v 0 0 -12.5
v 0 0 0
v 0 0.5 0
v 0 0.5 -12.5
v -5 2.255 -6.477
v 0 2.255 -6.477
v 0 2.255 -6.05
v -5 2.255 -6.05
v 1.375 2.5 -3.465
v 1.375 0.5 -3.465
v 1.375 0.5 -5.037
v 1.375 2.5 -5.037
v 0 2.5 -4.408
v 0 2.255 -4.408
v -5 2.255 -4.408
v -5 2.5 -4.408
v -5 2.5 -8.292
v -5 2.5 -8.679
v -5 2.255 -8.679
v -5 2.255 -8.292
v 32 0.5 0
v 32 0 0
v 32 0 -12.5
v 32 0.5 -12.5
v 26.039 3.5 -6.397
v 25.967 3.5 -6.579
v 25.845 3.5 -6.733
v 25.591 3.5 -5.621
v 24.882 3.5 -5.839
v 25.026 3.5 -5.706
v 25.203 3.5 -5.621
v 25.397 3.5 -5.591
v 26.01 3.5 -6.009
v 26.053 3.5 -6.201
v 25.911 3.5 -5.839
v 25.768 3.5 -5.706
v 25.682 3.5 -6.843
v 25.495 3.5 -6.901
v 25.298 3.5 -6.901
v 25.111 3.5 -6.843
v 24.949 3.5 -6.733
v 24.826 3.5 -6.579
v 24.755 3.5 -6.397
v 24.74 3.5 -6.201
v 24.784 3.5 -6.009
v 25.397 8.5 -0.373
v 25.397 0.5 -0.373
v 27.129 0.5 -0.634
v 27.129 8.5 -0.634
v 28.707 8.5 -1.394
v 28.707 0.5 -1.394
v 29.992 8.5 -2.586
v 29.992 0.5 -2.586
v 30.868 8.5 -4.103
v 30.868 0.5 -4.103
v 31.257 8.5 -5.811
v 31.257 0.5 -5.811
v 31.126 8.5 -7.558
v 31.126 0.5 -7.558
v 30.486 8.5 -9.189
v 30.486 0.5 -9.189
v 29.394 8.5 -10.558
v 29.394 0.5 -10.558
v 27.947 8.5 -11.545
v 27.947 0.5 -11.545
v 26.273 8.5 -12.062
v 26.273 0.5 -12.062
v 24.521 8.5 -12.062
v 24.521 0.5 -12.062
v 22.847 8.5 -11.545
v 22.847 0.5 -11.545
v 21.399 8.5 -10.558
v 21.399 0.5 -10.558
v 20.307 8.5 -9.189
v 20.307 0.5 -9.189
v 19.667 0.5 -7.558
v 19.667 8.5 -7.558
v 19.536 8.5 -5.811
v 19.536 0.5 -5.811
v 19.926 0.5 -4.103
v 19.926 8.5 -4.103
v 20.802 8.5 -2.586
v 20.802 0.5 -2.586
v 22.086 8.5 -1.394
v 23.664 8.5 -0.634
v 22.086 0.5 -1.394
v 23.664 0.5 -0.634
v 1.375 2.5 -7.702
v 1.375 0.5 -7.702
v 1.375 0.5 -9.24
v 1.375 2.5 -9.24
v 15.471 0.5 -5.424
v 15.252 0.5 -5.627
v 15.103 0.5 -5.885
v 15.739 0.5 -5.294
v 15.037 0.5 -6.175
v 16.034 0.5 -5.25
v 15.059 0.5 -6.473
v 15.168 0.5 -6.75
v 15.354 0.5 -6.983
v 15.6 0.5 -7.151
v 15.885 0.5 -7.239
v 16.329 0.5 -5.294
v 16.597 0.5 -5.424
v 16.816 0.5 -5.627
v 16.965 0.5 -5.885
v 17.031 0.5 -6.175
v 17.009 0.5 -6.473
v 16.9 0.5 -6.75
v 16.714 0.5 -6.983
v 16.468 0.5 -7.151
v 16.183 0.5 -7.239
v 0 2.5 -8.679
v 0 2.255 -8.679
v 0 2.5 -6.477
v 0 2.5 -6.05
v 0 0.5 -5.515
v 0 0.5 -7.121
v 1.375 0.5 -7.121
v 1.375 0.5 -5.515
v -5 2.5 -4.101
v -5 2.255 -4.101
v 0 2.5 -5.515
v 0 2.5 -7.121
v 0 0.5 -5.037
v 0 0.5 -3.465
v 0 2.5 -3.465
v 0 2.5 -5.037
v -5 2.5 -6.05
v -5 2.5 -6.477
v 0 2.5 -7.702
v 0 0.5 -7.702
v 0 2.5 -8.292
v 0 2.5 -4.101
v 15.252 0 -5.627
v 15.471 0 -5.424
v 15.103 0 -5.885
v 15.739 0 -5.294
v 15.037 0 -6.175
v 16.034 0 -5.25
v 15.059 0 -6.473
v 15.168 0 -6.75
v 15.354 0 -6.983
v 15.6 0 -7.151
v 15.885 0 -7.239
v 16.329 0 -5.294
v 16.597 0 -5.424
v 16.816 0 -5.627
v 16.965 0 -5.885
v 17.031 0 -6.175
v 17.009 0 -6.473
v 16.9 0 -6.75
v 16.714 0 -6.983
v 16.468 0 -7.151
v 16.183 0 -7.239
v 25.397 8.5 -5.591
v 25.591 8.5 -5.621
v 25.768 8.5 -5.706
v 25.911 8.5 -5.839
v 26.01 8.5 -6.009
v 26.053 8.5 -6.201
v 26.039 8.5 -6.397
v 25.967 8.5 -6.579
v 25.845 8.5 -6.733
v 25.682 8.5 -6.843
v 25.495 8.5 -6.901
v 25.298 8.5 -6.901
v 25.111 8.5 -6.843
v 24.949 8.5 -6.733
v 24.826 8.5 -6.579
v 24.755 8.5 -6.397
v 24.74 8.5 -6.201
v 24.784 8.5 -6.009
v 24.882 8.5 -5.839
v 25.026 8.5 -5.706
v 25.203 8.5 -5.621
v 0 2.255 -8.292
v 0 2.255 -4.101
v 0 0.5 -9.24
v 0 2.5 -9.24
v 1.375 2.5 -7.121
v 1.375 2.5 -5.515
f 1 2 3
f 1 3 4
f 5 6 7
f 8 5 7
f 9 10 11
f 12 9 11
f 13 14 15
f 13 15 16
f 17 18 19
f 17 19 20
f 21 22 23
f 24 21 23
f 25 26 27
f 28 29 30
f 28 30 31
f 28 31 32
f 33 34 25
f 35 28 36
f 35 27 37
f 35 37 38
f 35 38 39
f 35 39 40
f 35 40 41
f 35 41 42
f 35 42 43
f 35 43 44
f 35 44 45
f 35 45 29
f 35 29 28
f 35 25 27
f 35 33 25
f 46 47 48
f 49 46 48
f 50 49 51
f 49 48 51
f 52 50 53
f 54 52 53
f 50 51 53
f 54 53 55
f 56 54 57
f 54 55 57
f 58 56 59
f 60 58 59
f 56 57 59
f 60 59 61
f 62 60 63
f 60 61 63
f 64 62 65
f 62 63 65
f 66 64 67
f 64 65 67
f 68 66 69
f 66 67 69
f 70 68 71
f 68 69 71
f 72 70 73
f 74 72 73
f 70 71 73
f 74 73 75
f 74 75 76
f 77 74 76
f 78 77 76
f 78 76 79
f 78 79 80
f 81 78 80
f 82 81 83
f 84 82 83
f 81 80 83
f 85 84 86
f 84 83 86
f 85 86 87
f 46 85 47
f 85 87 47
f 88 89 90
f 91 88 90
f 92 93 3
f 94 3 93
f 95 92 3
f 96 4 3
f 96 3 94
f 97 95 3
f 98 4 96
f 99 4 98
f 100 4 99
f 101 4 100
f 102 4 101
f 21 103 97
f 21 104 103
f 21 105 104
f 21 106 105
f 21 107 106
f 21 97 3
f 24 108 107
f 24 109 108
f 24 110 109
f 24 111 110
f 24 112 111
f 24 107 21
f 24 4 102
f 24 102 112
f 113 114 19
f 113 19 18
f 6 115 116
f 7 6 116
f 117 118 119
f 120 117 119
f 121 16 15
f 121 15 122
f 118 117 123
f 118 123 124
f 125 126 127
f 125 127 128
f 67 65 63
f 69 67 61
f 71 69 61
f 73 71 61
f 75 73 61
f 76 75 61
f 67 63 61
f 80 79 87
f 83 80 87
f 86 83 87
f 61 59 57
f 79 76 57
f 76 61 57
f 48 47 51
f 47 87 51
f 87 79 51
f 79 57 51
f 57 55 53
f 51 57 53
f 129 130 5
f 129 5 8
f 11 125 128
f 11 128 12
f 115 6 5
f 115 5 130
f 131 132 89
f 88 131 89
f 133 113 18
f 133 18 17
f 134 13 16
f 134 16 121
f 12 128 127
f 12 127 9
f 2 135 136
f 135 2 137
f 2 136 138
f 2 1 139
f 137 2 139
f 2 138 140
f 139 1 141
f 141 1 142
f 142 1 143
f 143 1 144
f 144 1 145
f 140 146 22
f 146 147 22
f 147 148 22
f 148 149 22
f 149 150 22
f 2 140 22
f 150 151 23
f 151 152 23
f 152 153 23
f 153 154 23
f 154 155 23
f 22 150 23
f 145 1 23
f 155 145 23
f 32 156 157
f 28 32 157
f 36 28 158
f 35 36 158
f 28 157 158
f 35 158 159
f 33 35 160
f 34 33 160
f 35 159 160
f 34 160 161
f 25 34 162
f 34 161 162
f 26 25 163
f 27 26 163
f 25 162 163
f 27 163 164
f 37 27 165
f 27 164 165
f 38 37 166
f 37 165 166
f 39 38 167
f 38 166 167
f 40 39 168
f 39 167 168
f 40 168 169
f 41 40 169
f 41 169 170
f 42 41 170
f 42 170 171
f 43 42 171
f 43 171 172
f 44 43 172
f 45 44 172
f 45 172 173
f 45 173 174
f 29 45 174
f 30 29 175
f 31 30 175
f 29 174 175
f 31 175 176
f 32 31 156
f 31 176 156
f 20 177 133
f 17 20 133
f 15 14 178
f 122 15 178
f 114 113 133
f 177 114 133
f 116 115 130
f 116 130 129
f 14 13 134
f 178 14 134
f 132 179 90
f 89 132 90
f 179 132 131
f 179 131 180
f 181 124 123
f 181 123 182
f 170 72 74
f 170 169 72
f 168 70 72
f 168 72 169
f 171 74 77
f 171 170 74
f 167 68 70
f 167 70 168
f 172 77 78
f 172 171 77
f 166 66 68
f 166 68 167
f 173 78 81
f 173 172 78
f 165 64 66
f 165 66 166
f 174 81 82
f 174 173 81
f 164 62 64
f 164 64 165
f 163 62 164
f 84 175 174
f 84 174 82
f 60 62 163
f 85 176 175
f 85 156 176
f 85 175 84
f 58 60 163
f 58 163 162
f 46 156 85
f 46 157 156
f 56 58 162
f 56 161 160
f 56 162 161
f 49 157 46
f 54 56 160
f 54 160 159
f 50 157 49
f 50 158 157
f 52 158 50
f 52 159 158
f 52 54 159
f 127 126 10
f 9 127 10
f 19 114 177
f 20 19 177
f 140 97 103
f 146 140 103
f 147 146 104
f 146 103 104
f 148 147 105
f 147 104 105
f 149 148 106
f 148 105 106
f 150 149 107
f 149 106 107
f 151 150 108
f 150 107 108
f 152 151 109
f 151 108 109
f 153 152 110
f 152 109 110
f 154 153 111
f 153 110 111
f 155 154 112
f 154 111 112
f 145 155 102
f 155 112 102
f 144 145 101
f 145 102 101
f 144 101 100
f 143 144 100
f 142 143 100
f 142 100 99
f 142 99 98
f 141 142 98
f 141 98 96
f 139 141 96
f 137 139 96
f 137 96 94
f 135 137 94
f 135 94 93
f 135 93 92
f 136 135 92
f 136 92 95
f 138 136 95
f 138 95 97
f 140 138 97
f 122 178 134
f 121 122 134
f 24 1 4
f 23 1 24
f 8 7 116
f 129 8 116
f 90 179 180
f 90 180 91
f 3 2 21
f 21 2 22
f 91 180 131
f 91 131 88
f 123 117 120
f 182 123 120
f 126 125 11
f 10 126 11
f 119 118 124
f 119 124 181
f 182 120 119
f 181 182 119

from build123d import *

# Parameters (mm, degrees)
SKETCH1_W             = 32
SKETCH1_H             = 12.5
BOSS_EXTRUDE1_DEPTH   = 0.5
SKETCH2_R             = 5.877168317
BOSS_EXTRUDE3_DEPTH   = 8
SKETCH4_R             = 1
CUT_EXTRUDE1_DEPTH    = 8
SKETCH5_W             = 1.375418373
SKETCH5_H             = 1.605970413
BOSS_EXTRUDE4_DEPTH   = 2
SKETCH5_H_2           = 1.537631246
BOSS_EXTRUDE4_2_DEPTH = 2
SKETCH5_H_3           = 1.571800829
BOSS_EXTRUDE4_3_DEPTH = 2
SKETCH6_W             = 0.387077311
SKETCH6_H             = 0.245450271
BOSS_EXTRUDE5_DEPTH   = 5
SKETCH6_W_2           = 0.427119791
BOSS_EXTRUDE5_2_DEPTH = 5
SKETCH6_W_3           = 0.306992349
BOSS_EXTRUDE5_3_DEPTH = 5
SKETCH7_R             = 0.658510197
CUT_EXTRUDE2_DEPTH    = 5


with BuildPart() as part:
    # Sketch1 → Boss-Extrude1 (new body)
    with BuildSketch(Plane(origin=(0, 0, 0), x_dir=(1, 0, 0), z_dir=(0, 1, 0))):
        with Locations((16, 6.25)):
            Rectangle(SKETCH1_W, SKETCH1_H)
    extrude(amount=BOSS_EXTRUDE1_DEPTH)

    # Sketch4 → Cut-Extrude1 (cut)
    with BuildSketch(Plane(origin=(0, 0.5, 0), x_dir=(1, 0, 0), z_dir=(0, 1, 0))):
        with Locations(Location((16.034169583, 6.25, 0), (0, 0, 270))):
            Circle(SKETCH4_R)
    extrude(amount=-CUT_EXTRUDE1_DEPTH, mode=Mode.SUBTRACT)


with BuildPart() as body_2:
    # Sketch2 → Boss-Extrude3 (new body)
    with BuildSketch(Plane(origin=(0, 0.5, 0), x_dir=(1, 0, 0), z_dir=(0, 1, 0))):
        with Locations(Location((25.396635391, 6.25, 0), (0, 0, 270))):
            Circle(SKETCH2_R)
    extrude(amount=BOSS_EXTRUDE3_DEPTH)

    # Sketch7 → Cut-Extrude2 (cut)
    with BuildSketch(Plane(origin=(0, 8.5, 0), x_dir=(1, 0, 0), z_dir=(0, 1, 0))):
        with Locations(Location((25.396635391, 6.25, 0), (0, 0, 270))):
            Circle(SKETCH7_R)
    extrude(amount=-CUT_EXTRUDE2_DEPTH, mode=Mode.SUBTRACT)


with BuildPart() as body_3:
    # Sketch5 → Boss-Extrude4 (new body)
    with BuildSketch(Plane(origin=(0, 0.5, 0), x_dir=(1, 0, 0), z_dir=(0, 1, 0))):
        with Locations((0.687709187, 6.318339167)):
            Rectangle(SKETCH5_W, SKETCH5_H)
    extrude(amount=BOSS_EXTRUDE4_DEPTH)


with BuildPart() as body_4:
    # Sketch5 → Boss-Extrude4 2 (new body)
    with BuildSketch(Plane(origin=(0, 0.5, 0), x_dir=(1, 0, 0), z_dir=(0, 1, 0))):
        with Locations((0.687709187, 8.471022911)):
            Rectangle(SKETCH5_W, SKETCH5_H_2)
    extrude(amount=BOSS_EXTRUDE4_2_DEPTH)


with BuildPart() as body_5:
    # Sketch5 → Boss-Extrude4 3 (new body)
    with BuildSketch(Plane(origin=(0, 0.5, 0), x_dir=(1, 0, 0), z_dir=(0, 1, 0))):
        with Locations((0.687709187, 4.251079381)):
            Rectangle(SKETCH5_W, SKETCH5_H_3)
    extrude(amount=BOSS_EXTRUDE4_3_DEPTH)


with BuildPart() as body_6:
    # Sketch6 → Boss-Extrude5 (new body)
    with BuildSketch(Plane.ZY):
        with Locations((-8.485705153, 2.377274865)):
            Rectangle(SKETCH6_W, SKETCH6_H)
    extrude(amount=BOSS_EXTRUDE5_DEPTH)


with BuildPart() as body_7:
    # Sketch6 → Boss-Extrude5 2 (new body)
    with BuildSketch(Plane.ZY):
        with Locations((-6.263347493, 2.377274865)):
            Rectangle(SKETCH6_W_2, SKETCH6_H)
    extrude(amount=BOSS_EXTRUDE5_2_DEPTH)


with BuildPart() as body_8:
    # Sketch6 → Boss-Extrude5 3 (new body)
    with BuildSketch(Plane.ZY):
        with Locations((-4.254549729, 2.377274865)):
            Rectangle(SKETCH6_W_3, SKETCH6_H)
    extrude(amount=BOSS_EXTRUDE5_3_DEPTH)


solid = Compound([part.part, body_2.part, body_3.part, body_4.part, body_5.part, body_6.part, body_7.part, body_8.part])
